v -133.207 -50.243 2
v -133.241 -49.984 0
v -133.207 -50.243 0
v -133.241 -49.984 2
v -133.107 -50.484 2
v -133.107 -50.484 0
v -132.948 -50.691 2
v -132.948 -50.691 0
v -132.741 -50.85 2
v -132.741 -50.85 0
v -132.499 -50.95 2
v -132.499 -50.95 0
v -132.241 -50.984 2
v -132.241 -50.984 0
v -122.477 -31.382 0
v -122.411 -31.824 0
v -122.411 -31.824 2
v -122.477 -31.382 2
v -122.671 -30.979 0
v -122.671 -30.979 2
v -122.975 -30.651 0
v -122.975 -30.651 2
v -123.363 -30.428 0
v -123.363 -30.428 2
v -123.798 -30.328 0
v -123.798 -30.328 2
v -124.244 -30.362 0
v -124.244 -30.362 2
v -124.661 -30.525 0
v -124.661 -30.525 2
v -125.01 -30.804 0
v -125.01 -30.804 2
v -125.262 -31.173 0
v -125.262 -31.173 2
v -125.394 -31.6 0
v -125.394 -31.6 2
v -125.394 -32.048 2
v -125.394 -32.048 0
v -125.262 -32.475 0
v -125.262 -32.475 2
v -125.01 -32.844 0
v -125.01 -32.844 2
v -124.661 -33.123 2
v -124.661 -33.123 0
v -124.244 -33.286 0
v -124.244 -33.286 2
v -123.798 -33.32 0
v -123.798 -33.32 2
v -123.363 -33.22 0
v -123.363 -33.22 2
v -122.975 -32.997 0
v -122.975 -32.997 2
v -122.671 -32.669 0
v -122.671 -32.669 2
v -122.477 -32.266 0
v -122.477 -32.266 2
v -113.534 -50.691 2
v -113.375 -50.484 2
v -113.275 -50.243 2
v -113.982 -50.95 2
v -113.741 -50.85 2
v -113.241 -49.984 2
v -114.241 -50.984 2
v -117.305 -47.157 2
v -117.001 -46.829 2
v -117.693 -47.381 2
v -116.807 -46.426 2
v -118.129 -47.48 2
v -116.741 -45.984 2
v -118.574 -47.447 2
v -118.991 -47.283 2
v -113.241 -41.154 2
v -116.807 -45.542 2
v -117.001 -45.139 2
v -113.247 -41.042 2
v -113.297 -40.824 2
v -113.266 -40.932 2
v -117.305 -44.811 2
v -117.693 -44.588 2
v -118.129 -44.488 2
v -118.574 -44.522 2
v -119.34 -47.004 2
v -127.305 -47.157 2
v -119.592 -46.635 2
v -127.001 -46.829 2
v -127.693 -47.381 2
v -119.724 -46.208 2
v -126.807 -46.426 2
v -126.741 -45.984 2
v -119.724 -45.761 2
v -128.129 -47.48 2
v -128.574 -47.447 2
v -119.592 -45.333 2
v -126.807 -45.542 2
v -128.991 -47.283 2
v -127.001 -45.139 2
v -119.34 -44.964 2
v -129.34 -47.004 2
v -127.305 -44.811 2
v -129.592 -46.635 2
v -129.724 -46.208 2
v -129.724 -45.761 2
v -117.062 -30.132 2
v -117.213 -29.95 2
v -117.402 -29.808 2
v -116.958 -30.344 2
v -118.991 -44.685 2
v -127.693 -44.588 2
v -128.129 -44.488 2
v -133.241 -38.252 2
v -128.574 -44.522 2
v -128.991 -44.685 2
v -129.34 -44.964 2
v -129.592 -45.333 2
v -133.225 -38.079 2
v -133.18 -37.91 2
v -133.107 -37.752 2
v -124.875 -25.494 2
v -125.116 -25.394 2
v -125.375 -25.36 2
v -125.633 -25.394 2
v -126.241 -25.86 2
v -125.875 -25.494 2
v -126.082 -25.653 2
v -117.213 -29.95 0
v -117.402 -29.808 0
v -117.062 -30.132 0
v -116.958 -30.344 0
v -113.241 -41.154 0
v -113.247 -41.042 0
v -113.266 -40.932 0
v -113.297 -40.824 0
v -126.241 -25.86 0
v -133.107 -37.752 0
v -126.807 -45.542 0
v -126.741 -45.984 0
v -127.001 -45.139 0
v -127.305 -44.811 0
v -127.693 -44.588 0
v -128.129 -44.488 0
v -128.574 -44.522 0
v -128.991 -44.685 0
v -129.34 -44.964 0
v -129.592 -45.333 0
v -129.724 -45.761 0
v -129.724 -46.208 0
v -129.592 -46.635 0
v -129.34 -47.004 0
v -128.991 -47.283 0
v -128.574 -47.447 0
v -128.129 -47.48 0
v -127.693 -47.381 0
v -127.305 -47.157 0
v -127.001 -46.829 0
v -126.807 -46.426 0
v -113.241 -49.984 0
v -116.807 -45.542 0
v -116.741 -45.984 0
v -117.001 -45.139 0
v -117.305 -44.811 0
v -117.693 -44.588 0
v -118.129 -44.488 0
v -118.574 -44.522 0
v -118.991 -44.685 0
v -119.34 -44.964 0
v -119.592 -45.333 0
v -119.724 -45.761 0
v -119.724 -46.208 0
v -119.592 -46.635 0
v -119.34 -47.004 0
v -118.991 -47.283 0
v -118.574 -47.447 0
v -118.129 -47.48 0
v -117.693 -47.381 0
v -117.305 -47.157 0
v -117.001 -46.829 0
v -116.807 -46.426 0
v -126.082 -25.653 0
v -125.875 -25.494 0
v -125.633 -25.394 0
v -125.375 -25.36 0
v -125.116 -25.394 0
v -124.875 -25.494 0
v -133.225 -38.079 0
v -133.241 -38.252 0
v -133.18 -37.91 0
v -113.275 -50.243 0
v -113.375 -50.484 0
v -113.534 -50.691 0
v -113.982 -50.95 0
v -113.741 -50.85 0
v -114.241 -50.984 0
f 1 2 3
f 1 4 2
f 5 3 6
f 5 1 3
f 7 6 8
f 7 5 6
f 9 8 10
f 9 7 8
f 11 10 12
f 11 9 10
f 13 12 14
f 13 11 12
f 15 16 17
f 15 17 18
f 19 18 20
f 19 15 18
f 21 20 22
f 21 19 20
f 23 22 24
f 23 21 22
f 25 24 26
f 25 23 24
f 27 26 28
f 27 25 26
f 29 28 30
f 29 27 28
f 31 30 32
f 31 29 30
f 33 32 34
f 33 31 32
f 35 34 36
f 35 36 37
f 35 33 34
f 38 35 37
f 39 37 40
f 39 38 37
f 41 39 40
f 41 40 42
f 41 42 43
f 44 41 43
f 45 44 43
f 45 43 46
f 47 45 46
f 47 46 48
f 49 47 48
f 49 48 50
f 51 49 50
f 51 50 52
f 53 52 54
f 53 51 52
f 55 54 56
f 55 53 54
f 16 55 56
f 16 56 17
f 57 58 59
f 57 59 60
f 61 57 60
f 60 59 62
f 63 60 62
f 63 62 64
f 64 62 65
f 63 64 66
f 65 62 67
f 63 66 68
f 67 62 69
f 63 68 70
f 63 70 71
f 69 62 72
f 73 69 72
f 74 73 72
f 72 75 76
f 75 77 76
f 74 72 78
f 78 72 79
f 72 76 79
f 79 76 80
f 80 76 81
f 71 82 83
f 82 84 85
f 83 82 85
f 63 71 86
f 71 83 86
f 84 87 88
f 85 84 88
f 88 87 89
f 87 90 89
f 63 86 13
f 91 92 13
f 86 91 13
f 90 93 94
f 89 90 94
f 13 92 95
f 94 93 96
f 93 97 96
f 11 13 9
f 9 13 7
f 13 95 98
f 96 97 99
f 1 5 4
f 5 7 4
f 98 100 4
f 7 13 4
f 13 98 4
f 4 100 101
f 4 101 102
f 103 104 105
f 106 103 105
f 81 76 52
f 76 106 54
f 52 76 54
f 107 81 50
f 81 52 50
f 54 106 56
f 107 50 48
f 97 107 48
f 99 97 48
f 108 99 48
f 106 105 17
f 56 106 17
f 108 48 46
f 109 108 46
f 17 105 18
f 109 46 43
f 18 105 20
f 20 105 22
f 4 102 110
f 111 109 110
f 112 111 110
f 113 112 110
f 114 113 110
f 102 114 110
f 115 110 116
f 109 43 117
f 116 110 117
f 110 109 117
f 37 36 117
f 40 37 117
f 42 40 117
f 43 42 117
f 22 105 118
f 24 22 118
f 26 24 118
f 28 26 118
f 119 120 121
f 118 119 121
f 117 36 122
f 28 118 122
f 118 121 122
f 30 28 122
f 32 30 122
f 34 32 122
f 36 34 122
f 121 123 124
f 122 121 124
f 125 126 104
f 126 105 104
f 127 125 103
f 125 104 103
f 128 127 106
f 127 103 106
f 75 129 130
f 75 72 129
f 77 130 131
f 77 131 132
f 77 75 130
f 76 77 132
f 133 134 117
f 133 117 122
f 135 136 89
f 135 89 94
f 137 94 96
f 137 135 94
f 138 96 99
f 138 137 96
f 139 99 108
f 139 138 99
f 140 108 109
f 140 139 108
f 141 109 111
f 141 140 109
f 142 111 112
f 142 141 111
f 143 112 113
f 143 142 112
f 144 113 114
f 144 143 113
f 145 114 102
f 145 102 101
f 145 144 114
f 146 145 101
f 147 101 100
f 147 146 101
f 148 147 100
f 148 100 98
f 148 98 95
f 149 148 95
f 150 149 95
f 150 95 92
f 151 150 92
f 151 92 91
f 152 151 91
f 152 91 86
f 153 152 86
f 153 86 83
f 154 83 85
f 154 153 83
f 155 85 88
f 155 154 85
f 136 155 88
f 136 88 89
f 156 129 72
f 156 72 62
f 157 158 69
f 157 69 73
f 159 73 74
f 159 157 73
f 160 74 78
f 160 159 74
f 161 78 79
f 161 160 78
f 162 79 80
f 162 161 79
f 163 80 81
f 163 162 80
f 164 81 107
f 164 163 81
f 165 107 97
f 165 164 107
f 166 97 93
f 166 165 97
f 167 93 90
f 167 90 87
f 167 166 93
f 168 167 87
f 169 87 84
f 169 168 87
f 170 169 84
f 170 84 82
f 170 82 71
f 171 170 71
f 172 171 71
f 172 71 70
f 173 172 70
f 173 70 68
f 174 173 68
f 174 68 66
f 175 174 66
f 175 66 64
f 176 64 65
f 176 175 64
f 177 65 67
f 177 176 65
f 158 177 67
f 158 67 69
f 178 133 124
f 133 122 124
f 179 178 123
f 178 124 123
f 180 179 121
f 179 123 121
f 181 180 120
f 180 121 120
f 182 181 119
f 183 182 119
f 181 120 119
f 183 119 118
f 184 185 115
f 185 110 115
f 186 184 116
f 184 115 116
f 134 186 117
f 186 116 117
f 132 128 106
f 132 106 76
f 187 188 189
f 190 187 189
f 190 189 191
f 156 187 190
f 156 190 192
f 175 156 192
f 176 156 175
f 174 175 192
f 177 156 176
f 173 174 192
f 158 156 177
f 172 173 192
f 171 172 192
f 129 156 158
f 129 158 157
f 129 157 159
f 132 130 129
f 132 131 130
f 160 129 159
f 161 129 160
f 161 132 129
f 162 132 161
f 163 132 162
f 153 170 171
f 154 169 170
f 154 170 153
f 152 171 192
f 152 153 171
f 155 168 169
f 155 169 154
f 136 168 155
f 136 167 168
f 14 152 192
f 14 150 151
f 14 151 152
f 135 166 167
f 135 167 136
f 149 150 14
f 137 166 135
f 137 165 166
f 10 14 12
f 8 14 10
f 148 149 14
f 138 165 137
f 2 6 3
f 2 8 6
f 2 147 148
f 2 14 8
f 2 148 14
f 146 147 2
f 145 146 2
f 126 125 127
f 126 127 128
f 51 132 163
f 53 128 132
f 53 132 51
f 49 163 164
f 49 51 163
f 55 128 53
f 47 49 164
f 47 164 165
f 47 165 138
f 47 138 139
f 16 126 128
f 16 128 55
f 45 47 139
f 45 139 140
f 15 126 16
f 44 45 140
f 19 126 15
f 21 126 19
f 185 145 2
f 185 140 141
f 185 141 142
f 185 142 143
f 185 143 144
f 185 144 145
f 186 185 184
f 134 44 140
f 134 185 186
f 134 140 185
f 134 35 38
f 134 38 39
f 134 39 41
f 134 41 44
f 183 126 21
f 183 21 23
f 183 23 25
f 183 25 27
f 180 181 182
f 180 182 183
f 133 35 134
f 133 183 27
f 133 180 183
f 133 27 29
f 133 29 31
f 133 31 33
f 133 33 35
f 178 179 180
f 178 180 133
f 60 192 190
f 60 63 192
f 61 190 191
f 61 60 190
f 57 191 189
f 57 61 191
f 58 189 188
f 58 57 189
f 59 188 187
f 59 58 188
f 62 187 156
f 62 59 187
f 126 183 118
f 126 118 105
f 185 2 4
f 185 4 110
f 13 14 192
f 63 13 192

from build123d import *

# Parameters (mm, degrees)
SKETCH_1_R      = 1.5
EXTRUDE_1_DEPTH = 2
FILLET_1_R      = 1


with BuildPart() as part:
    # 草图1 → 凸台-拉伸1 (new body)
    with BuildSketch(Plane.XY):
        Polygon((-133.240644315, -50.984206154), (-133.240644315, -37.984206154), (-125.740644315, -24.993825098), (-117.080390278, -29.993825098), (-113.240644315, -40.984206154), (-113.240644315, -50.984206154), (-123.240644315, -50.984206154), align=None)
        with Locations((-128.240644315, -45.984206154)):
            Circle(SKETCH_1_R, mode=Mode.SUBTRACT)
        with Locations((-123.910517296, -31.823952117)):
            Circle(SKETCH_1_R, mode=Mode.SUBTRACT)
        with Locations((-118.240644315, -45.984206154)):
            Circle(SKETCH_1_R, mode=Mode.SUBTRACT)
    extrude(amount=EXTRUDE_1_DEPTH)

    # 圆角1
    fillet_1_edges = [part.edges().sort_by_distance(p)[0] for p in [
        (-133.240644315, -50.984206154, 1),
        (-133.240644315, -37.984206154, 1),
        (-125.740644315, -24.993825098, 1),
        (-117.080390278, -29.993825098, 1),
        (-113.240644315, -40.984206154, 1),
        (-113.240644315, -50.984206154, 1),
    ]]
    fillet(fillet_1_edges, radius=FILLET_1_R)


solid = part.part
